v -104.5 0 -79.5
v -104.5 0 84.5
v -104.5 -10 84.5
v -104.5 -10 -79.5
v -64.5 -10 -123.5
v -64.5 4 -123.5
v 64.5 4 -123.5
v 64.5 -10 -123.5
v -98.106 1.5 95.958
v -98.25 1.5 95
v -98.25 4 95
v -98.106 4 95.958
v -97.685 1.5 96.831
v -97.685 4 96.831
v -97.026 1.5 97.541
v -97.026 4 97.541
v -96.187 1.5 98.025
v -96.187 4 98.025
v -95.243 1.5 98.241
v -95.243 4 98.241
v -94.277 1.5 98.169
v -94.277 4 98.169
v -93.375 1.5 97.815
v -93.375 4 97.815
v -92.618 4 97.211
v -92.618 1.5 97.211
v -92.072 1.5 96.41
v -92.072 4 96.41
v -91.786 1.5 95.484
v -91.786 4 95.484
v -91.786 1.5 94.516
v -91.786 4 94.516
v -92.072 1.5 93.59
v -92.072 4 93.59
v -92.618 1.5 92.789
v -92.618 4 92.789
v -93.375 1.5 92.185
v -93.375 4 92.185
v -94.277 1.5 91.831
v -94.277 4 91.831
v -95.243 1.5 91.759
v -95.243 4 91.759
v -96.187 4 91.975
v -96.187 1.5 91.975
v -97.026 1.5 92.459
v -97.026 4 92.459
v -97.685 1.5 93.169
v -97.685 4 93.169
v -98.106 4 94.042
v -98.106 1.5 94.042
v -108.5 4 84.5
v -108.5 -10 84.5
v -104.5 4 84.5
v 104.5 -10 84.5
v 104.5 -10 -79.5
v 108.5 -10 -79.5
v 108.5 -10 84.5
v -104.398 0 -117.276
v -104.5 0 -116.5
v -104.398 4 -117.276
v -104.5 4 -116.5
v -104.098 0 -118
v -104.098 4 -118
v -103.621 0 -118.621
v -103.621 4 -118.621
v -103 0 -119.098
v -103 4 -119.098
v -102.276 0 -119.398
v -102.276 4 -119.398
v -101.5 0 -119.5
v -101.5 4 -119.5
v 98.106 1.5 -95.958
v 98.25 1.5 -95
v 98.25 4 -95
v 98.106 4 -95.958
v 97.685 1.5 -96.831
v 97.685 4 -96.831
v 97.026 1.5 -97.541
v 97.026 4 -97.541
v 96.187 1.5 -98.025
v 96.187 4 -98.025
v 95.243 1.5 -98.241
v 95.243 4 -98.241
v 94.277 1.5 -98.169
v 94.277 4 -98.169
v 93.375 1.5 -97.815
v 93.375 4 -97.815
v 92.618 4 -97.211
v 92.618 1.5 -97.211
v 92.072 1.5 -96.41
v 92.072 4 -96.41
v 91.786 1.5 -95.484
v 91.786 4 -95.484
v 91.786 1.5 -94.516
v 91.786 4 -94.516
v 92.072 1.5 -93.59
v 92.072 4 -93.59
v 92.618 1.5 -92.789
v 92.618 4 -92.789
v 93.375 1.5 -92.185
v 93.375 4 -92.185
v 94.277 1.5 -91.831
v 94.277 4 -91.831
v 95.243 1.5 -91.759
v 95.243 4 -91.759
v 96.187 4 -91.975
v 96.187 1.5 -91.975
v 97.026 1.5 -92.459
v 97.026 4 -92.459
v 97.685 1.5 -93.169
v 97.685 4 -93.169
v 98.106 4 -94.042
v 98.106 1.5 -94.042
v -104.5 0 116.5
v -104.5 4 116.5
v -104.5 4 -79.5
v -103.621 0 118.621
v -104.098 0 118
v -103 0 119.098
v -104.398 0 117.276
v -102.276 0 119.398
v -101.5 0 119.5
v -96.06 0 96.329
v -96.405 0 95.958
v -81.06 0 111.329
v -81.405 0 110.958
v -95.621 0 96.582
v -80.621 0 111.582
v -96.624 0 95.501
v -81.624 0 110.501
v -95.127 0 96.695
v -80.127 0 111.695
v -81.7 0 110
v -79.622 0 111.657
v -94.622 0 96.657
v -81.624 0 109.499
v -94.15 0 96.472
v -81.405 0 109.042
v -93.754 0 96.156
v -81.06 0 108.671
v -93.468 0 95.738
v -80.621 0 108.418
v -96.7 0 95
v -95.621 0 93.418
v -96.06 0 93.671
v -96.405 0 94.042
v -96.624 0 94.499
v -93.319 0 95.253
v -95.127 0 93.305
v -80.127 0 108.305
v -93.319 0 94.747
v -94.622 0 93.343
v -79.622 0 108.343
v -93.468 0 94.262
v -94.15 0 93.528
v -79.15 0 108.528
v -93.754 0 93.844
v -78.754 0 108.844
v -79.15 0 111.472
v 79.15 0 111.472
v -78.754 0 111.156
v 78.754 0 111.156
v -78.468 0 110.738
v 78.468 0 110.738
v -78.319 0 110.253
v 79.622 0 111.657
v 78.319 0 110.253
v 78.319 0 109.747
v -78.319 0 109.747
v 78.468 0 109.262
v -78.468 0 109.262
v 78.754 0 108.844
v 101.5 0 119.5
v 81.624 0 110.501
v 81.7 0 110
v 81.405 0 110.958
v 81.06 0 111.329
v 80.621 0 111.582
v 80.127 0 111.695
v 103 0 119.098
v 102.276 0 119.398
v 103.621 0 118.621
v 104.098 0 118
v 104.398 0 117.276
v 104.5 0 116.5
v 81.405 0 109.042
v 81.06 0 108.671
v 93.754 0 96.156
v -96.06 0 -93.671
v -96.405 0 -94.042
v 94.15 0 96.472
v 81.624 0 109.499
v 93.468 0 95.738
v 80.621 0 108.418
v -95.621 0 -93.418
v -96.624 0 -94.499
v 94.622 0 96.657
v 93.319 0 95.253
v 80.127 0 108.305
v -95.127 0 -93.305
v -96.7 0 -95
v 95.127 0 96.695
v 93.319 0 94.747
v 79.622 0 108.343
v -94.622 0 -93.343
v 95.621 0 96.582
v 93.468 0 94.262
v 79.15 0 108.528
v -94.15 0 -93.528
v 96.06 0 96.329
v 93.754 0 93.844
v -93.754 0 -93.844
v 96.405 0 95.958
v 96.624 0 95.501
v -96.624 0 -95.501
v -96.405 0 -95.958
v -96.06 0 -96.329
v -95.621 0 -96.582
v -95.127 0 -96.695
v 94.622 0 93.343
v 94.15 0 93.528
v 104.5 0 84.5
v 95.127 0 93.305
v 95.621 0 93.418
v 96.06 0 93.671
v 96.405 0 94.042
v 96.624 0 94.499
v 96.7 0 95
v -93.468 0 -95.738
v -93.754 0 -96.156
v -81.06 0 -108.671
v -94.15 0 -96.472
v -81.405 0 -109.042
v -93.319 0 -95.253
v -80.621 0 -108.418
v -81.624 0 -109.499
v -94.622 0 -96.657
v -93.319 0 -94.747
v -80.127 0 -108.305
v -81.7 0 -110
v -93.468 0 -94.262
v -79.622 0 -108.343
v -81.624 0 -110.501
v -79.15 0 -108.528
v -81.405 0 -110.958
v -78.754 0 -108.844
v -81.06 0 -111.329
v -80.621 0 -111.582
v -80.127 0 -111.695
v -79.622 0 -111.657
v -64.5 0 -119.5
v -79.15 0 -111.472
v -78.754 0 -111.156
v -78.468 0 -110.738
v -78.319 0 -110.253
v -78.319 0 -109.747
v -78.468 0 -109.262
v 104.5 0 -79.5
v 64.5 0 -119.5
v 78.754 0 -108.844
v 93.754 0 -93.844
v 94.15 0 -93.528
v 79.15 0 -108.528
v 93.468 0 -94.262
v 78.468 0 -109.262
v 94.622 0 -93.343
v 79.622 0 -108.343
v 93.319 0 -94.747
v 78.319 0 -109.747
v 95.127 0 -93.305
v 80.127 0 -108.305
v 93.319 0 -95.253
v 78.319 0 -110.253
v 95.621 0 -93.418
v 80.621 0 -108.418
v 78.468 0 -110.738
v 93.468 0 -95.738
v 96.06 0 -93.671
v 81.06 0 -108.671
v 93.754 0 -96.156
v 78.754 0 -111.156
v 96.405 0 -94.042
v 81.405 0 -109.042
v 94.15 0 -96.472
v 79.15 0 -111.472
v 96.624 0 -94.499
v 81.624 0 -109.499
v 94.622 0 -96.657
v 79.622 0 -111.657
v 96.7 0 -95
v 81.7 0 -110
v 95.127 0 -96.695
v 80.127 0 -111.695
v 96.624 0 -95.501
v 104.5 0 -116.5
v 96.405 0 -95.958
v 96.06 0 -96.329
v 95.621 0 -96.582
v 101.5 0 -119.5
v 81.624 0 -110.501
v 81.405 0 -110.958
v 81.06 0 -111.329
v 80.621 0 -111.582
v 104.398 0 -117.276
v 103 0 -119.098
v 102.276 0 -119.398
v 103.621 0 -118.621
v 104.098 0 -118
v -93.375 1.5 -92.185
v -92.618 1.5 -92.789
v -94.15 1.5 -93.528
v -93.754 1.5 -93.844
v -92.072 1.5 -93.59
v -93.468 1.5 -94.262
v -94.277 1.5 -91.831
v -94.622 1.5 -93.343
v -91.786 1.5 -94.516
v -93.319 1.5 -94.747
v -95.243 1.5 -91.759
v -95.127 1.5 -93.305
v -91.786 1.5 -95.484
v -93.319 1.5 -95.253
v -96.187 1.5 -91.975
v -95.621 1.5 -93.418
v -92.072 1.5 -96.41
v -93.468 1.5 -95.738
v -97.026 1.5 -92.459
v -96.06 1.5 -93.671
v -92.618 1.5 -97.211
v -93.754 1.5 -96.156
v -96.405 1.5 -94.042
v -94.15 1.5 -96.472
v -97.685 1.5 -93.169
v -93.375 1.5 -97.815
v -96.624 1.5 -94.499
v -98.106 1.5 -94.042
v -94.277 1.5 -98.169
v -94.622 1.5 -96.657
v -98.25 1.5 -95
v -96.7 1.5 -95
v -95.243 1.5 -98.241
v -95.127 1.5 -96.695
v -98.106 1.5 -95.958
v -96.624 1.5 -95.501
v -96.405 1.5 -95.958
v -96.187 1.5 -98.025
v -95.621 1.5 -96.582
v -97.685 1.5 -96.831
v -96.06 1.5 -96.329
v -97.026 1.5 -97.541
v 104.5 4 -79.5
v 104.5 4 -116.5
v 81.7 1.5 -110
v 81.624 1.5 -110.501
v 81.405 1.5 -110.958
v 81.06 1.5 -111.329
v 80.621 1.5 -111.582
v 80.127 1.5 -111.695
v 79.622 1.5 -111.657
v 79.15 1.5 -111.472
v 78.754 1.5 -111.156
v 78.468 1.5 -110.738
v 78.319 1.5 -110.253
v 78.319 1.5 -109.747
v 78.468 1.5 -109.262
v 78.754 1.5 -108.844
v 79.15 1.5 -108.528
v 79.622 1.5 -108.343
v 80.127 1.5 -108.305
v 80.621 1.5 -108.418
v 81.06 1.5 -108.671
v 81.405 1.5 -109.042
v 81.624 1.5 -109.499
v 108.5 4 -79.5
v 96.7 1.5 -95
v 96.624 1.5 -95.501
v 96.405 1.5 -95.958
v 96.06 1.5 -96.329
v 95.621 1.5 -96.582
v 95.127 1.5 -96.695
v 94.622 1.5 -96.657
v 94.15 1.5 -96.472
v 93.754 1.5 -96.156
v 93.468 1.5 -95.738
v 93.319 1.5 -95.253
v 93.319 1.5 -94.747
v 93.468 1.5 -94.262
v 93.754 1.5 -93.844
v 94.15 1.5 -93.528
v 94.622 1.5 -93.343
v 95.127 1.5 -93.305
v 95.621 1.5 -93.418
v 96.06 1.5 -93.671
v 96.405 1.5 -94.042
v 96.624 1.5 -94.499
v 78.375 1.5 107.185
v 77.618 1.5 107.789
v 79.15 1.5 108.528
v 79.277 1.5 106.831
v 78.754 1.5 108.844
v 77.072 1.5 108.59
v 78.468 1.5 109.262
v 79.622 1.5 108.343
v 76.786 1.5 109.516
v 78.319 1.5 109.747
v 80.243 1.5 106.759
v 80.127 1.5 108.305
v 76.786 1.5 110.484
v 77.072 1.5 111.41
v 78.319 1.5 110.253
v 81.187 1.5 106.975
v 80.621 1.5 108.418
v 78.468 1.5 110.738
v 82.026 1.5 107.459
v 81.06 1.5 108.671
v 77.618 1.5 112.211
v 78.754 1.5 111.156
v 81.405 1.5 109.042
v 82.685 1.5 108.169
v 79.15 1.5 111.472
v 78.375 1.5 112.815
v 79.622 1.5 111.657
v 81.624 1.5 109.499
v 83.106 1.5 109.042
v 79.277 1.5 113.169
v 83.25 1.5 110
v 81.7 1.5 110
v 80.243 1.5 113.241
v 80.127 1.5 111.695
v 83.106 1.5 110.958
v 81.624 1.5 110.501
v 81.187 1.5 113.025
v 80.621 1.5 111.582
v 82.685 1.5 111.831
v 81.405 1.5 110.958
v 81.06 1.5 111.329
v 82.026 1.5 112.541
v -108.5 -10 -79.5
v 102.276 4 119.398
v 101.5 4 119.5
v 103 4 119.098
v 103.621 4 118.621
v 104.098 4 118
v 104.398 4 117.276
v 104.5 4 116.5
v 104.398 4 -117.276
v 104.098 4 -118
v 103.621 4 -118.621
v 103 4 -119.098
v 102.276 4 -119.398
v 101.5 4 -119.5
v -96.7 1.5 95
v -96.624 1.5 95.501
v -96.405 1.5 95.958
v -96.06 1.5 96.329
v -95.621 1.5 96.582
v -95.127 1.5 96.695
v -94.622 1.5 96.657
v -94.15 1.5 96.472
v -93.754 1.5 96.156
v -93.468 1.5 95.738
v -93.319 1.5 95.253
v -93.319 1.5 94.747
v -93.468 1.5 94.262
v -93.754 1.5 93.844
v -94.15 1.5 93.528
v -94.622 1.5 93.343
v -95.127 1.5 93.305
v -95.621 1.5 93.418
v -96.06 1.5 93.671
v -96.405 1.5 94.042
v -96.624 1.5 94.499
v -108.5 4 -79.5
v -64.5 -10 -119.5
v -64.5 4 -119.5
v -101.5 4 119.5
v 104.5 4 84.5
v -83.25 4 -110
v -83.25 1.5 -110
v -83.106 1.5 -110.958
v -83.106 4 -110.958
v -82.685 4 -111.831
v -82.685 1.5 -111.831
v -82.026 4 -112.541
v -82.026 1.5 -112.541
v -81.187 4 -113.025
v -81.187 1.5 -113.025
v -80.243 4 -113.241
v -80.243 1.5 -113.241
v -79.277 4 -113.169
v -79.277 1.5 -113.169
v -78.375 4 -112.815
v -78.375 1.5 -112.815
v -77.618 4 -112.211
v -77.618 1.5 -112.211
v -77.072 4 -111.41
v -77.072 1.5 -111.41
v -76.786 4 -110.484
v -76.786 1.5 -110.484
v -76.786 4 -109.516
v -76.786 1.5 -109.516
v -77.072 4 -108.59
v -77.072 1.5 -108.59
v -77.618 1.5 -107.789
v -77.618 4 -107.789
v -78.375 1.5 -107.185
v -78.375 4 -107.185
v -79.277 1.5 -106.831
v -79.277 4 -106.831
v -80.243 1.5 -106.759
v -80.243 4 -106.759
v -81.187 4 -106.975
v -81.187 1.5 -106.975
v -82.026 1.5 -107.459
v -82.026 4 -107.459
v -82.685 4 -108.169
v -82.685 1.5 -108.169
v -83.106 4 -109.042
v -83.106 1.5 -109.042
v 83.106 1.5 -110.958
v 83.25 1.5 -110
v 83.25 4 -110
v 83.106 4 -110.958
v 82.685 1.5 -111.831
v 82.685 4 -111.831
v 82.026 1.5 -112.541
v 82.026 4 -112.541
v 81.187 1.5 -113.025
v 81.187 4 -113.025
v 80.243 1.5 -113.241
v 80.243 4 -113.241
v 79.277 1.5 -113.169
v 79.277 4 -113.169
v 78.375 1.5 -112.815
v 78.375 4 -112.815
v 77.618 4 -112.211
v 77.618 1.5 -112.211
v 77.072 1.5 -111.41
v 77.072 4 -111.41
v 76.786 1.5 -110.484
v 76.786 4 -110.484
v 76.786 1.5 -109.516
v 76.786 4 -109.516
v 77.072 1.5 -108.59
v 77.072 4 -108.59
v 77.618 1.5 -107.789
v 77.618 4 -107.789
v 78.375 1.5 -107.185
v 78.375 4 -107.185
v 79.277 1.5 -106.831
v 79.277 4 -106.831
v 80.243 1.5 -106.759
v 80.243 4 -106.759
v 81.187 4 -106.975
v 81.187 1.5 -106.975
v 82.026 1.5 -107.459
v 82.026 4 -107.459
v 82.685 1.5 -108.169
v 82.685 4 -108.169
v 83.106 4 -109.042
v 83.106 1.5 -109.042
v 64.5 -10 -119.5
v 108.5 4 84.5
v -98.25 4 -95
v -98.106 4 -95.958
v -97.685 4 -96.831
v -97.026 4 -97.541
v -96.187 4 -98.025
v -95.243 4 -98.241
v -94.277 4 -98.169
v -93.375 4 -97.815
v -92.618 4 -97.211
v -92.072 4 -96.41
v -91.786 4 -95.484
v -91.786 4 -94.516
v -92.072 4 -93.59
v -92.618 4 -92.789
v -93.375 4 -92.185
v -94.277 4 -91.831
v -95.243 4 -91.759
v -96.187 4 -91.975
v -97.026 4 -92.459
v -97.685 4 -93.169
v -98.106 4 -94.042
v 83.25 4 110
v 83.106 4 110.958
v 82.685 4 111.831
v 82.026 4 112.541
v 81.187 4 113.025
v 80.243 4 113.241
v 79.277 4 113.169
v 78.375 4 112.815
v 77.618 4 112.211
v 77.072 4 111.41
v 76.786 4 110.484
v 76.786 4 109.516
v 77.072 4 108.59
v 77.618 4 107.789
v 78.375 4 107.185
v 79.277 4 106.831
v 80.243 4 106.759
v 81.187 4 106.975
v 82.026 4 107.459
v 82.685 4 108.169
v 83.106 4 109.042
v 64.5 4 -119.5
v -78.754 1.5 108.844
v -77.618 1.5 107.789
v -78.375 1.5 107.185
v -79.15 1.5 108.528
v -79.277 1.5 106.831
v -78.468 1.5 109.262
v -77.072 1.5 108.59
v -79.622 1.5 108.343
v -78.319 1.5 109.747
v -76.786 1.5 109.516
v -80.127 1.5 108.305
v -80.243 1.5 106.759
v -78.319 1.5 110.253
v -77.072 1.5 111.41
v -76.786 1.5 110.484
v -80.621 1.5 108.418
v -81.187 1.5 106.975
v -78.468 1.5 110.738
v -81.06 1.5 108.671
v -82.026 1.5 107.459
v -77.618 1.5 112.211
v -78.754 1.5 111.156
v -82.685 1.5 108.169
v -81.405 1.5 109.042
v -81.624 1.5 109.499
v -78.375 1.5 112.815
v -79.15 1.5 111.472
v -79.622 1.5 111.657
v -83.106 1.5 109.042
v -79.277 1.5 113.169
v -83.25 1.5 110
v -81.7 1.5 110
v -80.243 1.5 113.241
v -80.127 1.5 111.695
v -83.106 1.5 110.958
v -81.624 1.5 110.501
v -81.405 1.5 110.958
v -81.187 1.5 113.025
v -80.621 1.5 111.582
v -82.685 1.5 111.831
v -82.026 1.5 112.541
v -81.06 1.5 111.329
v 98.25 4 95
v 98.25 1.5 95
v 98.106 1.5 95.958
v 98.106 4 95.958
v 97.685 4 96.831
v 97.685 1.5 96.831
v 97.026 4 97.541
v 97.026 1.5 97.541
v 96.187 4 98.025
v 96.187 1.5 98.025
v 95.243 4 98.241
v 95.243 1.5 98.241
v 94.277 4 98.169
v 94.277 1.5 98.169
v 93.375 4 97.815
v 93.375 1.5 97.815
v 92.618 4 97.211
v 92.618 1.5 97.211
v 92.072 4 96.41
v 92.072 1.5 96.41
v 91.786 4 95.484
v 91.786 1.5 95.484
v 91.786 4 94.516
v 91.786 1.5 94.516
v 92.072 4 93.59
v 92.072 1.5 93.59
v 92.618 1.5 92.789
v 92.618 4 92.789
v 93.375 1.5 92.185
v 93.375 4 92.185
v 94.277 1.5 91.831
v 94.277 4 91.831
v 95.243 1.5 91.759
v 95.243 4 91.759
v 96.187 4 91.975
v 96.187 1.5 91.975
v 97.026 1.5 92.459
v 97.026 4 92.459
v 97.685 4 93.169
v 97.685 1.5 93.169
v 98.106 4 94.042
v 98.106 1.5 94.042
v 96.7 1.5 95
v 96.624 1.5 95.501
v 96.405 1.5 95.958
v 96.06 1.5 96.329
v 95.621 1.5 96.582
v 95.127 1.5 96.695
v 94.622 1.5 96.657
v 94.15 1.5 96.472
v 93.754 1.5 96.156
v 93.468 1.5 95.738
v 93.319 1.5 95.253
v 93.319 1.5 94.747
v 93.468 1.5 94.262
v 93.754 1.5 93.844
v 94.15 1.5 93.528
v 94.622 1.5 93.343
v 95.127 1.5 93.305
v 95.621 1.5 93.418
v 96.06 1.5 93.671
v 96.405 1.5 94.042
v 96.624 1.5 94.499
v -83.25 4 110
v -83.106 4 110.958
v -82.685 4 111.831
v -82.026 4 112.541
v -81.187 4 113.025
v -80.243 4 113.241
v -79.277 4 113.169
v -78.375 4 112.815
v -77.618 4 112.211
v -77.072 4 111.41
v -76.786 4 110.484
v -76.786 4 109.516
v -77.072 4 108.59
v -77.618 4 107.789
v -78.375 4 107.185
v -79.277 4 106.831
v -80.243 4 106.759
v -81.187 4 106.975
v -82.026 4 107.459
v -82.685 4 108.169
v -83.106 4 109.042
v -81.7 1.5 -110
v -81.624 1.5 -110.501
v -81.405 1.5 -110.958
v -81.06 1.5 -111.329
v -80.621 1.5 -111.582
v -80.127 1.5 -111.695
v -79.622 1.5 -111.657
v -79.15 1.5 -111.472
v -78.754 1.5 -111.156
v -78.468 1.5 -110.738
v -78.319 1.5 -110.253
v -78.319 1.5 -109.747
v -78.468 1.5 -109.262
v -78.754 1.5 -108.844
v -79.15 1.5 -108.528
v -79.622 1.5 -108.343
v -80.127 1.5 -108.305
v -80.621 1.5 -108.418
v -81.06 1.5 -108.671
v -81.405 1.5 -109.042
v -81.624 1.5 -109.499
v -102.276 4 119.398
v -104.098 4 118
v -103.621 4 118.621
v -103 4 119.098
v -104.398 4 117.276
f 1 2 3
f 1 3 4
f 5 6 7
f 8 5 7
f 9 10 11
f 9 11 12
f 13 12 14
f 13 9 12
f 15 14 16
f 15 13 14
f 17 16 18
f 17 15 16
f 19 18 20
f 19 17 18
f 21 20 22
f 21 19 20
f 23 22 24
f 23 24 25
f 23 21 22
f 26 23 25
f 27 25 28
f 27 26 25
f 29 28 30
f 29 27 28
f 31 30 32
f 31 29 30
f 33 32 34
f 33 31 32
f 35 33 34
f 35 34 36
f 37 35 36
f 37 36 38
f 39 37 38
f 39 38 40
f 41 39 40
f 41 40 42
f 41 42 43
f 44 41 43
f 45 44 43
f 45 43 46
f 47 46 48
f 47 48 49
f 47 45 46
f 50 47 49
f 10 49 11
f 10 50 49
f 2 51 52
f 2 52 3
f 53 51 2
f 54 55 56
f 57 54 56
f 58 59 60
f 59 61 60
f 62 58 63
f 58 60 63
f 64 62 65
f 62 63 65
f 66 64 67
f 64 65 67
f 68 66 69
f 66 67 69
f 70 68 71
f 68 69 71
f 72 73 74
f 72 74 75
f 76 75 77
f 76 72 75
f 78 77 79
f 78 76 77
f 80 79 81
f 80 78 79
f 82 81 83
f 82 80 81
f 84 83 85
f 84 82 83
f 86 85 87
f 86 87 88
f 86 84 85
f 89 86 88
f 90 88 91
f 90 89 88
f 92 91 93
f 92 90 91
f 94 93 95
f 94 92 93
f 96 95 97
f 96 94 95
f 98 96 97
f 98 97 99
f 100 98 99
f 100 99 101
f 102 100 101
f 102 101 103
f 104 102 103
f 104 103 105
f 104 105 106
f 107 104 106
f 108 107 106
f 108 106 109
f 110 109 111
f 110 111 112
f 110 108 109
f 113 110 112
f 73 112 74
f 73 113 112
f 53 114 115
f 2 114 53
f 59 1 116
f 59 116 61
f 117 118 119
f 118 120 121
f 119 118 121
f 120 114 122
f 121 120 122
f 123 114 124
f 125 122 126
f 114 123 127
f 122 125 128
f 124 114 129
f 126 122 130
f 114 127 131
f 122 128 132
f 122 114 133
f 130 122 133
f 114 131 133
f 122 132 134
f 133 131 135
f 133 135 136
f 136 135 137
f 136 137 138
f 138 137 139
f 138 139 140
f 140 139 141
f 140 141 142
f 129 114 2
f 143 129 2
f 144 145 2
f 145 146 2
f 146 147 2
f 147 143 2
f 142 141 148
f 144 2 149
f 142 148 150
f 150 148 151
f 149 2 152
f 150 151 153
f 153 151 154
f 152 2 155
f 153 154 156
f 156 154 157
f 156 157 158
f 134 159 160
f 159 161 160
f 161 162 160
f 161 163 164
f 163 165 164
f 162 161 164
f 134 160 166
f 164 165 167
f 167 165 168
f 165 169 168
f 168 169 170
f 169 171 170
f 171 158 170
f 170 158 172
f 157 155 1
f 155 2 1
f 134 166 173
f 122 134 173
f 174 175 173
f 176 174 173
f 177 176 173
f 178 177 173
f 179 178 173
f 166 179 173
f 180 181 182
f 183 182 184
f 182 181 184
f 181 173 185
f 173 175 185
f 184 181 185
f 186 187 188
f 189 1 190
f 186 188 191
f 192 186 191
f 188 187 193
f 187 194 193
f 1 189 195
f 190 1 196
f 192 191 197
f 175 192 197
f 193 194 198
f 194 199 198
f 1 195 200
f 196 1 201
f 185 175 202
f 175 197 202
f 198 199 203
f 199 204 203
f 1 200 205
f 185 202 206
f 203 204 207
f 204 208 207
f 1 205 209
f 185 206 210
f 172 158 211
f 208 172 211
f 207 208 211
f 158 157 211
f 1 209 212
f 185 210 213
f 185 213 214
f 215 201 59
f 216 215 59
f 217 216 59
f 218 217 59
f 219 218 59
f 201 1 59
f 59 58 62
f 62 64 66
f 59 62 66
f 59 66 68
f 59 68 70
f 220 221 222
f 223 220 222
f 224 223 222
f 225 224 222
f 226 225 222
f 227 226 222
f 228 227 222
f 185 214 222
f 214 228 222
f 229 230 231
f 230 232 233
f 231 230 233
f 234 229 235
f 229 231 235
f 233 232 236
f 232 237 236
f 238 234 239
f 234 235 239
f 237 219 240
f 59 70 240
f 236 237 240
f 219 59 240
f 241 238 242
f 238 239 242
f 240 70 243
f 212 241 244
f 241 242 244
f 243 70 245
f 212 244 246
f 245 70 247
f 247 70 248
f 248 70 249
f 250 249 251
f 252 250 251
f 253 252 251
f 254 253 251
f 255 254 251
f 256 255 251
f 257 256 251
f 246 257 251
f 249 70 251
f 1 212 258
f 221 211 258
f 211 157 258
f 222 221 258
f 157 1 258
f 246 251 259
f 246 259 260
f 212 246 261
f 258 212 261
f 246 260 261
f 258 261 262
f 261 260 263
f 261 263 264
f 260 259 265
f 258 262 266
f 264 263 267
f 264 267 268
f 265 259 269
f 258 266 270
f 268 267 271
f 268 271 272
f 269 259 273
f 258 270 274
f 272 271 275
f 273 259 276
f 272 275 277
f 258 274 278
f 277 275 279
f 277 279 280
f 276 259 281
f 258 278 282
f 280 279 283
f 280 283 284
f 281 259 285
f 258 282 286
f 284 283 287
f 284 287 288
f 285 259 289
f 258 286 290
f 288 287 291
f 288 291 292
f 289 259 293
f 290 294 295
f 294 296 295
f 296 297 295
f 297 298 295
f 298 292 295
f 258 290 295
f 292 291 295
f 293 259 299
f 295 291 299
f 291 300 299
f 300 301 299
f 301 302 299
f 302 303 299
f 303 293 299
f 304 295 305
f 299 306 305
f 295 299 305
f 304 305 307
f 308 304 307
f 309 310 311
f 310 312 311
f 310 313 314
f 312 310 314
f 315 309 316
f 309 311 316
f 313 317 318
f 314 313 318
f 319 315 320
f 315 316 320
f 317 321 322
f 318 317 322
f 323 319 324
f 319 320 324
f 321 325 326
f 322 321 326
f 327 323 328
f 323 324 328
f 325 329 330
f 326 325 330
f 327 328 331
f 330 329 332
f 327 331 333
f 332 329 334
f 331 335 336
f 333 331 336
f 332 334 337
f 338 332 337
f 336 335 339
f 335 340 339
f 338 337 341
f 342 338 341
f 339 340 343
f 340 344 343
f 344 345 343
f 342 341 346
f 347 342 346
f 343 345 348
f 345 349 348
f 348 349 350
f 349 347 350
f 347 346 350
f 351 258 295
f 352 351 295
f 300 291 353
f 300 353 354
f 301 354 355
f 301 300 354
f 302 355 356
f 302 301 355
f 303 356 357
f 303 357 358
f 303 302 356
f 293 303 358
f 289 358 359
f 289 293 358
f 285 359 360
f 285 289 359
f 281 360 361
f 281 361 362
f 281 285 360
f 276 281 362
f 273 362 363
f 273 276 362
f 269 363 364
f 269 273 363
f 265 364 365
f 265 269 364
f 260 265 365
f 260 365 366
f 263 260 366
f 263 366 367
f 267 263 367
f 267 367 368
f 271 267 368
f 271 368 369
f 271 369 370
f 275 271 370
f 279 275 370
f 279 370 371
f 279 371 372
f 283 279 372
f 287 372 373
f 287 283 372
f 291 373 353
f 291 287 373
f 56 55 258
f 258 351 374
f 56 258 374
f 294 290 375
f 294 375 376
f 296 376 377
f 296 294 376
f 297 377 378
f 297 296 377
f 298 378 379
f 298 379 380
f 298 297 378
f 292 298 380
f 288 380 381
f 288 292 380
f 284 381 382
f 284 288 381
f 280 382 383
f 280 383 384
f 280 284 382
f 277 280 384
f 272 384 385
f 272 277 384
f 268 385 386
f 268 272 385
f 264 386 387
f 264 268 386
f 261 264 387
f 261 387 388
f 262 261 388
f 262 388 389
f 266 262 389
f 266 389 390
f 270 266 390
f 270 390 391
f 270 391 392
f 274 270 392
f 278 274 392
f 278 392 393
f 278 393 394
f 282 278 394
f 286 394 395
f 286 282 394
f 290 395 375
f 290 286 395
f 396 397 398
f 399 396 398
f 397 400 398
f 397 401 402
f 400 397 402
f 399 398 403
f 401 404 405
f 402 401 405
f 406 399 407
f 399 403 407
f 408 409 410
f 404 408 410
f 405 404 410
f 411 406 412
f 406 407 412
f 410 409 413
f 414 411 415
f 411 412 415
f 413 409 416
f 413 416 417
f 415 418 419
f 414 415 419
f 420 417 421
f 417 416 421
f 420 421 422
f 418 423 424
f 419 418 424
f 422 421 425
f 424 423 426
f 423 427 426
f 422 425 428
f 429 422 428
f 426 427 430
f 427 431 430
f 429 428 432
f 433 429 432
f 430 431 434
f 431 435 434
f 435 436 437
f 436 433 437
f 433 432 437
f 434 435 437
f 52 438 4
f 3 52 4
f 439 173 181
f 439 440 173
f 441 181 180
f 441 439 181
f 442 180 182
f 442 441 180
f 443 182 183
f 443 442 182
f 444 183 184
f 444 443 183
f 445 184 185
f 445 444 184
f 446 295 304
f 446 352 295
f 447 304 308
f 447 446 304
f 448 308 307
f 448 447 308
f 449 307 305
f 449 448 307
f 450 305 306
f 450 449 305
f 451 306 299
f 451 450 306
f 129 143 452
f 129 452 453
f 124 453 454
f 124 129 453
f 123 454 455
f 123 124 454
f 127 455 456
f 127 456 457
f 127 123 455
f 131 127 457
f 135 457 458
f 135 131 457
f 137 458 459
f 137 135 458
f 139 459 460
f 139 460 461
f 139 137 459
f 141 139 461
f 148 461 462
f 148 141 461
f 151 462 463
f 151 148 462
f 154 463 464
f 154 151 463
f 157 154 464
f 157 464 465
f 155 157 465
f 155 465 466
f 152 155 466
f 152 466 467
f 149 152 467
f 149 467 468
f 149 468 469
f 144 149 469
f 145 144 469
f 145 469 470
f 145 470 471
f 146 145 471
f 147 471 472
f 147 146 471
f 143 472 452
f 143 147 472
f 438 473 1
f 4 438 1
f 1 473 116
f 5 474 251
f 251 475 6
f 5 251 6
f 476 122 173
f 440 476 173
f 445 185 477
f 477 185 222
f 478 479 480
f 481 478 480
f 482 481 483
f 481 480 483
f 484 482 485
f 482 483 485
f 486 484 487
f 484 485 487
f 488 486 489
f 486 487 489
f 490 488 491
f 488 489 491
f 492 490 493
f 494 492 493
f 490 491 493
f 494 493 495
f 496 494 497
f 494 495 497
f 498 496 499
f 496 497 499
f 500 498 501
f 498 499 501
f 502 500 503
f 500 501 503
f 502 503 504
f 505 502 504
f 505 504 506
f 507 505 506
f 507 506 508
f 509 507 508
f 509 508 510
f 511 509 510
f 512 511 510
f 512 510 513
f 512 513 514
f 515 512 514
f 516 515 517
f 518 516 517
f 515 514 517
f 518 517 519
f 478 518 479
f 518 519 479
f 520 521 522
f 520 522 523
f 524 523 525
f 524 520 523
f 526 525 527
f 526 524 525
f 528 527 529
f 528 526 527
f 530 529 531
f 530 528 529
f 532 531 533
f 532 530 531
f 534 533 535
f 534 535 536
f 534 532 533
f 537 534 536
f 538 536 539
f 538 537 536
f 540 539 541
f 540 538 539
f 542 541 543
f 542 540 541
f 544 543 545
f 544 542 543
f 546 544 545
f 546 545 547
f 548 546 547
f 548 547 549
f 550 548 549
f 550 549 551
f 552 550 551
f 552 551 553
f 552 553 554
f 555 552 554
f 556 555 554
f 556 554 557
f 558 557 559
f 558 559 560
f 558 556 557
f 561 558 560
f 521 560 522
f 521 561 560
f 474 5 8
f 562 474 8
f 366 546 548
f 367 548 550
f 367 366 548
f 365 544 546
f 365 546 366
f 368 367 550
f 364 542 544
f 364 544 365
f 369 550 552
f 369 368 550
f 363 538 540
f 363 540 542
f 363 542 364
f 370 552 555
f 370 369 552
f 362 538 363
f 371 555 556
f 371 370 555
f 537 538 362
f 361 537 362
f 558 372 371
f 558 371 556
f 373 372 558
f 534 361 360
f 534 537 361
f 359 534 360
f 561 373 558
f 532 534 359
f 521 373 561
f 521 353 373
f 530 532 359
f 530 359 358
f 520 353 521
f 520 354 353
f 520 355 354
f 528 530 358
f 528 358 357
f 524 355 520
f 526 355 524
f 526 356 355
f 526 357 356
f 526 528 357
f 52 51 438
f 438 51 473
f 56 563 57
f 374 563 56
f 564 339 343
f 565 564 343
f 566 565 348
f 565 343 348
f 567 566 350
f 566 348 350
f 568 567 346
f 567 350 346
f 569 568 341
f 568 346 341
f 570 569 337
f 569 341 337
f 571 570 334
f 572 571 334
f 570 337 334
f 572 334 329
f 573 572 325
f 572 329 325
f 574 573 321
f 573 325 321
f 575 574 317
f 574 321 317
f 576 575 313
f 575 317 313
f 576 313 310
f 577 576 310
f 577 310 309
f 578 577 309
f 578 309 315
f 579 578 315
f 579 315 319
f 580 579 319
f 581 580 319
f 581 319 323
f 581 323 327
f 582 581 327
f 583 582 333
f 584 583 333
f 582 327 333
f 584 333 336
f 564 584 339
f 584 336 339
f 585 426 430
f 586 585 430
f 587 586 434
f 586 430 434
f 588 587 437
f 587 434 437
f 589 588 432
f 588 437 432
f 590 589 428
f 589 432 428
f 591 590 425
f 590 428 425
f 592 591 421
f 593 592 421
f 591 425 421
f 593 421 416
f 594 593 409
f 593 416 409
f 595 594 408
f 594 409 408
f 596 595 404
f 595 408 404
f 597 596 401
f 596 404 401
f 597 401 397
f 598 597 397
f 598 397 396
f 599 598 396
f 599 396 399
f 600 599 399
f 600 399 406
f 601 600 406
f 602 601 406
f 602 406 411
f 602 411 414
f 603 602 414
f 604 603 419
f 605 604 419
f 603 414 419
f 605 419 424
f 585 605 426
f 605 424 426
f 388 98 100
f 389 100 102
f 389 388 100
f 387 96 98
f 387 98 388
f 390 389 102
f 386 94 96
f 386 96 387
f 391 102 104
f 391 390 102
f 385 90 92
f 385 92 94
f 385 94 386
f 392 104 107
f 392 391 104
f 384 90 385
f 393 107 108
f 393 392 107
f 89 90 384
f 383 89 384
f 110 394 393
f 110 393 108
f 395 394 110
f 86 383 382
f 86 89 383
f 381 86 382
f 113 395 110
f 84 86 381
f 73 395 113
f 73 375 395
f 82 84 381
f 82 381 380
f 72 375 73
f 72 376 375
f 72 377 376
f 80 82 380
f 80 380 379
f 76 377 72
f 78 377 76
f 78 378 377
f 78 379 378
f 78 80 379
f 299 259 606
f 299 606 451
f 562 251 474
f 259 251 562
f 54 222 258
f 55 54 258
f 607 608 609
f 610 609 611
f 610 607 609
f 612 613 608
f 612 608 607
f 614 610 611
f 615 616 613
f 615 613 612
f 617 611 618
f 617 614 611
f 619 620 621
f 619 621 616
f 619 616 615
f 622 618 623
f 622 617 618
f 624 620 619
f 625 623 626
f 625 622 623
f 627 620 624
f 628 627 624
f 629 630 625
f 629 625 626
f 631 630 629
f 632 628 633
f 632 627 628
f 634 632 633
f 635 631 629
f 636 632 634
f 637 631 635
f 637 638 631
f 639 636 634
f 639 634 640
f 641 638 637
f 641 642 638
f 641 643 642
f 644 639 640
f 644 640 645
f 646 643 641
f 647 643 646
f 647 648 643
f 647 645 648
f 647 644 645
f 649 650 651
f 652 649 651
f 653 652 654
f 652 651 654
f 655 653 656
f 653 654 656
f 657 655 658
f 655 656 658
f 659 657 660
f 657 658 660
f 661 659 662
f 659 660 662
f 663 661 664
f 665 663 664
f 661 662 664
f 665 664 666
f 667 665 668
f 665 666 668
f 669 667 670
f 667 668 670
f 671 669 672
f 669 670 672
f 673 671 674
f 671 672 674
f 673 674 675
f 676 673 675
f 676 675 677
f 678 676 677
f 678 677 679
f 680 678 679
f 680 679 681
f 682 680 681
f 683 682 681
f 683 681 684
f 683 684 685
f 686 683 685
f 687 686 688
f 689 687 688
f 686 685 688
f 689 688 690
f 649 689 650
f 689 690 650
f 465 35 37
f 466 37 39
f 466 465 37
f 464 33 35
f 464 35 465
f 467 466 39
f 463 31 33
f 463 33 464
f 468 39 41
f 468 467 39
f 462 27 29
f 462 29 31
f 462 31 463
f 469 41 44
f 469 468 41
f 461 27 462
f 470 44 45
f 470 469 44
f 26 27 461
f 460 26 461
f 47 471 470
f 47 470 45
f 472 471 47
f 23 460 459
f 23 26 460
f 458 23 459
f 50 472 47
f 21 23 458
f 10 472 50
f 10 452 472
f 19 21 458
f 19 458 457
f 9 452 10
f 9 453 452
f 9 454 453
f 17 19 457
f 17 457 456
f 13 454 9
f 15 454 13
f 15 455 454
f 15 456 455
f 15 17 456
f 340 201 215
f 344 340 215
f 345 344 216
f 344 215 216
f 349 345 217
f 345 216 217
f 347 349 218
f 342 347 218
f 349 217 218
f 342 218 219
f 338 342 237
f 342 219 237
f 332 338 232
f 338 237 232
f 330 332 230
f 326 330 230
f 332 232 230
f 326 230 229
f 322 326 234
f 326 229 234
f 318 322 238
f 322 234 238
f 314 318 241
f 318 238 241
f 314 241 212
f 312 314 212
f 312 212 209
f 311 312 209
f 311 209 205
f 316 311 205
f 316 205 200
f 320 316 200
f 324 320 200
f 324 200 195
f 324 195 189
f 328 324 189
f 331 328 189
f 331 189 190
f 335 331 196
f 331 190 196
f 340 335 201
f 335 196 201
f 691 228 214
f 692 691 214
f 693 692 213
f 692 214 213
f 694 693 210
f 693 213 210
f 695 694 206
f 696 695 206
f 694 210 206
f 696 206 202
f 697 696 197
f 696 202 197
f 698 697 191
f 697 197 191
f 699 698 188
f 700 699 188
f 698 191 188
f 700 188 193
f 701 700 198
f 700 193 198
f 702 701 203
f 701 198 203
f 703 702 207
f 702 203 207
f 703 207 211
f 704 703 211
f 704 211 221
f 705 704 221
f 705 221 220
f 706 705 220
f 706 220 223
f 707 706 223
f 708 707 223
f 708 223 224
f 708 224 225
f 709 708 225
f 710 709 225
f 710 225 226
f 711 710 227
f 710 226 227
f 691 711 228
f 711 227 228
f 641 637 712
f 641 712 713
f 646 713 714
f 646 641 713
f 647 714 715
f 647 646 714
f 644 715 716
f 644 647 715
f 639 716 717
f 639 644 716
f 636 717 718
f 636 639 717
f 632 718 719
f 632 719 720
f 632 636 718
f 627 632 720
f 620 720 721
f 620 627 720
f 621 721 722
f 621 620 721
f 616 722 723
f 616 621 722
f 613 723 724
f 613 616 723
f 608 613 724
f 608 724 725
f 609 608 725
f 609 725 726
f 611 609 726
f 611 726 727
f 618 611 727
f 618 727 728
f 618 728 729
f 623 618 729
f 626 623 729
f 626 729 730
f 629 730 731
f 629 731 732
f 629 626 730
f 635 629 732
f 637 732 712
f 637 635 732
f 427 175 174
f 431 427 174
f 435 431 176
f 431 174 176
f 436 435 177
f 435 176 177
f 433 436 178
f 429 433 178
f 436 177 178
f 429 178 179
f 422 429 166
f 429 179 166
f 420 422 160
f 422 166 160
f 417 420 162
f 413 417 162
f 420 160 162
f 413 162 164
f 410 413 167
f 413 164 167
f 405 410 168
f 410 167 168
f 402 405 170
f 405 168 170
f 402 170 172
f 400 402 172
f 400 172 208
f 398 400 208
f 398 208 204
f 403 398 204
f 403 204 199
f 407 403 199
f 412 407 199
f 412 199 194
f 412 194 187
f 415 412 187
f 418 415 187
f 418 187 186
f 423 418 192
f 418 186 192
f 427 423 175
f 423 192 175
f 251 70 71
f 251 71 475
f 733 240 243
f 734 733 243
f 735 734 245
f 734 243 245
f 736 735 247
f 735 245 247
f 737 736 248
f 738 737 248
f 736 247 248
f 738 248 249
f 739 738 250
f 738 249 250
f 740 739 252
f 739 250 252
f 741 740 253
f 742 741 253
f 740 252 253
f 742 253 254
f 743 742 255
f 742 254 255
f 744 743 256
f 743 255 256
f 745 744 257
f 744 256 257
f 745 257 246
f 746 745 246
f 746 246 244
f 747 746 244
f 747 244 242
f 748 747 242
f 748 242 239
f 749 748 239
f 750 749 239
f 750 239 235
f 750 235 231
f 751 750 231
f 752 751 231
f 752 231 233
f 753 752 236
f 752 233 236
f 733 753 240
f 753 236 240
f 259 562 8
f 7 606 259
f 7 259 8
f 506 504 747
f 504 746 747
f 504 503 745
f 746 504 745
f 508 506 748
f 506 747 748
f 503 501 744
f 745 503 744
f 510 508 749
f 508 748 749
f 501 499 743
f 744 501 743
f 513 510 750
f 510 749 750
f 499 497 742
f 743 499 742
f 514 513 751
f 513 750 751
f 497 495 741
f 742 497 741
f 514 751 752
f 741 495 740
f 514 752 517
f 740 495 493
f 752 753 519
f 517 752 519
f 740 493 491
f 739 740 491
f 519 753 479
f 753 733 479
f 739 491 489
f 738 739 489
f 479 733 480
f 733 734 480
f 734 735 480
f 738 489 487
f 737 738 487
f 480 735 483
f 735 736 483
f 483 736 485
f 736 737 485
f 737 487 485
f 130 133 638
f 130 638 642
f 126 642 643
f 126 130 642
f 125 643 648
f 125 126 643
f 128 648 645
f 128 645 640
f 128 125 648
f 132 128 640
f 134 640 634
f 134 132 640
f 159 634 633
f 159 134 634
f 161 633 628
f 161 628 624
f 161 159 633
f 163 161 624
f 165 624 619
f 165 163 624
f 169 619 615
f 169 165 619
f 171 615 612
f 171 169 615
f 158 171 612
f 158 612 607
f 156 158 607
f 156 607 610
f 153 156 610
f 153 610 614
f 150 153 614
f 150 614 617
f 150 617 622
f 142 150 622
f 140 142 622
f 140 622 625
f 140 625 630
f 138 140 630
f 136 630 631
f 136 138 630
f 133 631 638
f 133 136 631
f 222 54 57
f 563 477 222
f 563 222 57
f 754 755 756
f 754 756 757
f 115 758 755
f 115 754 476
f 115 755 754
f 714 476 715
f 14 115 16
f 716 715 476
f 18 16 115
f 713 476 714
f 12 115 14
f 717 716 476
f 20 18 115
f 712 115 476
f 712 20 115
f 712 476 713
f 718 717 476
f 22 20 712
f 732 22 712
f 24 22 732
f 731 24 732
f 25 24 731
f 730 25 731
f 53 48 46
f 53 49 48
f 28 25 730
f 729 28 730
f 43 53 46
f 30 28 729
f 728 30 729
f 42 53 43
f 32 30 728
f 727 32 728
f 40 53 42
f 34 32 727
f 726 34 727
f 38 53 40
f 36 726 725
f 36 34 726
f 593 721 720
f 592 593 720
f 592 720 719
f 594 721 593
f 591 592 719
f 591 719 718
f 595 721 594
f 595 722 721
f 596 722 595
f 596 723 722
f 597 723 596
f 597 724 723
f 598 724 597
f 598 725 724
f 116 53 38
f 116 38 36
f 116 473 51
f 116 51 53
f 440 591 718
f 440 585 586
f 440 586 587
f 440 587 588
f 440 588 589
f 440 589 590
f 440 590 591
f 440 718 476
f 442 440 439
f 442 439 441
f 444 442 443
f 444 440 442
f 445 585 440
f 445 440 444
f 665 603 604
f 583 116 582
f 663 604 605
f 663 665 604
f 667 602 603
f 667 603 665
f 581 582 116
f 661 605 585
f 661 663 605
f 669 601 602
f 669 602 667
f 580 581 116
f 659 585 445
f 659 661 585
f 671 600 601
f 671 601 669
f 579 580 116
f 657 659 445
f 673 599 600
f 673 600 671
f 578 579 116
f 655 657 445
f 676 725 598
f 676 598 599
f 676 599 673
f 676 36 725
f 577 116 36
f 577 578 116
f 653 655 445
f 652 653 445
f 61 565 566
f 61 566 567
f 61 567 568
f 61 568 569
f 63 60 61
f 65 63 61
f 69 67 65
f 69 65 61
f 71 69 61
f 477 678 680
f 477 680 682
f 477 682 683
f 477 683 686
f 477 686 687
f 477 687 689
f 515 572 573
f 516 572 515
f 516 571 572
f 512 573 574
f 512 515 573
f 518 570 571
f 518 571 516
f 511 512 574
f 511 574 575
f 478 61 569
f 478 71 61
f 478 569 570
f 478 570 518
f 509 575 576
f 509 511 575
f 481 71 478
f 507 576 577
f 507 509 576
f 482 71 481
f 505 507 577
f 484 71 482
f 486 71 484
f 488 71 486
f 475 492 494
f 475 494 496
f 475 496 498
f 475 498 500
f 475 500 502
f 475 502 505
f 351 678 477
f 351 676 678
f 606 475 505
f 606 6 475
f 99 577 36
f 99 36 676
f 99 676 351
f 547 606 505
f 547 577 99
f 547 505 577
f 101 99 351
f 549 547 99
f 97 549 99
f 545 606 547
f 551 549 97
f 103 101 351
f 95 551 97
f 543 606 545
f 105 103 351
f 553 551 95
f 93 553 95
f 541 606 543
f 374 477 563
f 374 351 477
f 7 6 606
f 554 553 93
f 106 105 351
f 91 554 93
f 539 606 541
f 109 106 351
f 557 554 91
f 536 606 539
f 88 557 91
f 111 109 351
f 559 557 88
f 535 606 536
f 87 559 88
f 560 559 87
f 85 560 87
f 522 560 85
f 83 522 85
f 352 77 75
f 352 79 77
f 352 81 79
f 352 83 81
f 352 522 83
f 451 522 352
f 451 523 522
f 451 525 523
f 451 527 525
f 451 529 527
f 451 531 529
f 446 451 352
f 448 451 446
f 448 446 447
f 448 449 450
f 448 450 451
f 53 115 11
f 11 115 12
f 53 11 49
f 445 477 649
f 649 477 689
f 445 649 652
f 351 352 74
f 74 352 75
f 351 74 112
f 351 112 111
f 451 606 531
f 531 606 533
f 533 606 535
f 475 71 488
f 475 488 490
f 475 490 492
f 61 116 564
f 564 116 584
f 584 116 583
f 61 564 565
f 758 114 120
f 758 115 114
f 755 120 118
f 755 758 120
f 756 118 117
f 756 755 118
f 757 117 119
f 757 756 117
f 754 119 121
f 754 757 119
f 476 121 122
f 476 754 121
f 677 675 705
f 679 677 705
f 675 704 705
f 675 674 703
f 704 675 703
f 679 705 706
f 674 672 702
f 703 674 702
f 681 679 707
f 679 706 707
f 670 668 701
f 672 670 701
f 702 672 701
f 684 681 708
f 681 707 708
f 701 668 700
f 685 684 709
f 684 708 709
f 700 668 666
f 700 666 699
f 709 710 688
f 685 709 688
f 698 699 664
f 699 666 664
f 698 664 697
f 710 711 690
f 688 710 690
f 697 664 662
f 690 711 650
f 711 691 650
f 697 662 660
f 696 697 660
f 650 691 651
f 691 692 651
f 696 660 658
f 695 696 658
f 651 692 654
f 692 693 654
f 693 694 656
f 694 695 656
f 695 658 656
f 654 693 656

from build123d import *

# Parameters (mm, degrees)
SKETCH1_W                              = 209
SKETCH1_H                              = 239
BASE_PLATE_DEPTH                       = 4
MOUNTING_HOLES_START                   = 1.5
MOUNTING_HOLES_OUTLINE_R               = 3.25
MOUNTING_HOLES_DEPTH                   = 2.5
MOUNTING_HOLES_2_OUTLINE_R             = 1.7
MOUNTING_HOLES_2_DEPTH                 = 1.5
MOUNTING_HOLES_MIRROR2_START           = 1.5
MOUNTING_HOLES_MIRROR2_COPY_1_SKETCH_R = 3.25
MOUNTING_HOLES_MIRROR2_COPY_1_DEPTH    = 2.5
MOUNTING_HOLES_MIRROR2_COPY_2_SKETCH_R = 1.7
MOUNTING_HOLES_MIRROR2_COPY_2_DEPTH    = 1.5
MOUNTING_HOLES_MIRROR2_COPY_3_SKETCH_R = 1.7
MOUNTING_HOLES_MIRROR2_COPY_3_DEPTH    = 1.5
SKETCH5_W                              = 129
SKETCH5_H                              = 4
SIDE_EXTRUSION_DEPTH                   = 14
SKETCH6_W                              = 4
SKETCH6_H                              = 164
UPPER_LOWER_EXTRUSION_DEPTH            = 14
EDGE_FILLETS_R                         = 3


# Read off the part's stored shape, not the designer's step: mounting_holes
with BuildPart() as part:
    # Sketch1 → base_plate (new body)
    with BuildSketch(Plane(origin=(0, 0, 0), x_dir=(1, 0, 0), z_dir=(0, 1, 0))):
        Rectangle(SKETCH1_W, SKETCH1_H)
    extrude(amount=BASE_PLATE_DEPTH)

    # mounting_holes outline → mounting_holes (cut)
    with BuildSketch(Plane(origin=(0, 0, 0), x_dir=(1, 0, 0), z_dir=(0, 1, 0)).offset(MOUNTING_HOLES_START)):
        with Locations((95, 95)):
            Circle(MOUNTING_HOLES_OUTLINE_R)
        with Locations((80, 110)):
            Circle(MOUNTING_HOLES_OUTLINE_R)
    mounting_holes = extrude(amount=MOUNTING_HOLES_DEPTH, mode=Mode.SUBTRACT)

    # mounting_holes 2 outline → mounting_holes 2 (cut)
    with BuildSketch(Plane(origin=(0, 0, 0), x_dir=(1, 0, 0), z_dir=(0, 1, 0))):
        with Locations((95, 95)):
            Circle(MOUNTING_HOLES_2_OUTLINE_R)
        with Locations((80, 110)):
            Circle(MOUNTING_HOLES_2_OUTLINE_R)
    mounting_holes_2 = extrude(amount=MOUNTING_HOLES_2_DEPTH, mode=Mode.SUBTRACT)

    # mounting_holes_mirror1: mounting_holes, mounting_holes 2 across plane
    add(mounting_holes.mirror(Plane.XY), mode=Mode.SUBTRACT)
    add(mounting_holes_2.mirror(Plane.XY), mode=Mode.SUBTRACT)

    # mounting_holes_mirror2: mounting_holes, mounting_holes 2 across plane
    add(mounting_holes.mirror(Plane(origin=(0, 0, 0), x_dir=(0, 0, 1), z_dir=(1, 0, 0))), mode=Mode.SUBTRACT)
    add(mounting_holes_2.mirror(Plane(origin=(0, 0, 0), x_dir=(0, 0, 1), z_dir=(1, 0, 0))), mode=Mode.SUBTRACT)

    # mounting_holes_mirror2 copy 1 sketch → mounting_holes_mirror2 copy 1 (cut)
    with BuildSketch(Plane(origin=(0, 0, 0), x_dir=(-1, 0, 0), z_dir=(0, 1, 0)).offset(MOUNTING_HOLES_MIRROR2_START)):
        with Locations((95, 95)):
            Circle(MOUNTING_HOLES_MIRROR2_COPY_1_SKETCH_R)
        with Locations((80, 110)):
            Circle(MOUNTING_HOLES_MIRROR2_COPY_1_SKETCH_R)
    extrude(amount=MOUNTING_HOLES_MIRROR2_COPY_1_DEPTH, mode=Mode.SUBTRACT)

    # mounting_holes_mirror2 copy 2 sketch → mounting_holes_mirror2 copy 2 (cut)
    with BuildSketch(Plane(origin=(0, 0, 0), x_dir=(-1, 0, 0), z_dir=(0, 1, 0))):
        with Locations((95, 95)):
            Circle(MOUNTING_HOLES_MIRROR2_COPY_2_SKETCH_R)
        with Locations((80, 110)):
            Circle(MOUNTING_HOLES_MIRROR2_COPY_2_SKETCH_R)
    extrude(amount=MOUNTING_HOLES_MIRROR2_COPY_2_DEPTH, mode=Mode.SUBTRACT)

    # mounting_holes_mirror2 copy 3 sketch → mounting_holes_mirror2 copy 3 (cut)
    with BuildSketch(Plane(origin=(0, 0, 0), x_dir=(-1, 0, 0), z_dir=(0, 1, 0))):
        with Locations((95, -95)):
            Circle(MOUNTING_HOLES_MIRROR2_COPY_3_SKETCH_R)
        with Locations((80, -110)):
            Circle(MOUNTING_HOLES_MIRROR2_COPY_3_SKETCH_R)
    extrude(amount=MOUNTING_HOLES_MIRROR2_COPY_3_DEPTH, mode=Mode.SUBTRACT)

    # Sketch5 → side_extrusion (add)
    with BuildSketch(Plane(origin=(0, 4, 0), x_dir=(1, 0, 0), z_dir=(0, 1, 0))):
        with Locations((0, 121.5)):
            Rectangle(SKETCH5_W, SKETCH5_H)
    extrude(amount=-SIDE_EXTRUSION_DEPTH)

    # Sketch6 → upper_lower_extrusion (add)
    with BuildSketch(Plane(origin=(0, 4, 0), x_dir=(1, 0, 0), z_dir=(0, 1, 0))):
        with Locations((-106.5, -2.5)):
            Rectangle(SKETCH6_W, SKETCH6_H)
        with Locations((106.5, -2.5)):
            Rectangle(SKETCH6_W, SKETCH6_H)
    extrude(amount=-UPPER_LOWER_EXTRUSION_DEPTH)

    # edge_fillets
    edge_fillets_edges = [part.edges().sort_by_distance(p)[0] for p in [
        (104.5, 2, 119.5),
        (-104.5, 2, 119.5),
        (-104.5, 2, -119.5),
        (104.5, 2, -119.5),
    ]]
    fillet(edge_fillets_edges, radius=EDGE_FILLETS_R)


solid = part.part
